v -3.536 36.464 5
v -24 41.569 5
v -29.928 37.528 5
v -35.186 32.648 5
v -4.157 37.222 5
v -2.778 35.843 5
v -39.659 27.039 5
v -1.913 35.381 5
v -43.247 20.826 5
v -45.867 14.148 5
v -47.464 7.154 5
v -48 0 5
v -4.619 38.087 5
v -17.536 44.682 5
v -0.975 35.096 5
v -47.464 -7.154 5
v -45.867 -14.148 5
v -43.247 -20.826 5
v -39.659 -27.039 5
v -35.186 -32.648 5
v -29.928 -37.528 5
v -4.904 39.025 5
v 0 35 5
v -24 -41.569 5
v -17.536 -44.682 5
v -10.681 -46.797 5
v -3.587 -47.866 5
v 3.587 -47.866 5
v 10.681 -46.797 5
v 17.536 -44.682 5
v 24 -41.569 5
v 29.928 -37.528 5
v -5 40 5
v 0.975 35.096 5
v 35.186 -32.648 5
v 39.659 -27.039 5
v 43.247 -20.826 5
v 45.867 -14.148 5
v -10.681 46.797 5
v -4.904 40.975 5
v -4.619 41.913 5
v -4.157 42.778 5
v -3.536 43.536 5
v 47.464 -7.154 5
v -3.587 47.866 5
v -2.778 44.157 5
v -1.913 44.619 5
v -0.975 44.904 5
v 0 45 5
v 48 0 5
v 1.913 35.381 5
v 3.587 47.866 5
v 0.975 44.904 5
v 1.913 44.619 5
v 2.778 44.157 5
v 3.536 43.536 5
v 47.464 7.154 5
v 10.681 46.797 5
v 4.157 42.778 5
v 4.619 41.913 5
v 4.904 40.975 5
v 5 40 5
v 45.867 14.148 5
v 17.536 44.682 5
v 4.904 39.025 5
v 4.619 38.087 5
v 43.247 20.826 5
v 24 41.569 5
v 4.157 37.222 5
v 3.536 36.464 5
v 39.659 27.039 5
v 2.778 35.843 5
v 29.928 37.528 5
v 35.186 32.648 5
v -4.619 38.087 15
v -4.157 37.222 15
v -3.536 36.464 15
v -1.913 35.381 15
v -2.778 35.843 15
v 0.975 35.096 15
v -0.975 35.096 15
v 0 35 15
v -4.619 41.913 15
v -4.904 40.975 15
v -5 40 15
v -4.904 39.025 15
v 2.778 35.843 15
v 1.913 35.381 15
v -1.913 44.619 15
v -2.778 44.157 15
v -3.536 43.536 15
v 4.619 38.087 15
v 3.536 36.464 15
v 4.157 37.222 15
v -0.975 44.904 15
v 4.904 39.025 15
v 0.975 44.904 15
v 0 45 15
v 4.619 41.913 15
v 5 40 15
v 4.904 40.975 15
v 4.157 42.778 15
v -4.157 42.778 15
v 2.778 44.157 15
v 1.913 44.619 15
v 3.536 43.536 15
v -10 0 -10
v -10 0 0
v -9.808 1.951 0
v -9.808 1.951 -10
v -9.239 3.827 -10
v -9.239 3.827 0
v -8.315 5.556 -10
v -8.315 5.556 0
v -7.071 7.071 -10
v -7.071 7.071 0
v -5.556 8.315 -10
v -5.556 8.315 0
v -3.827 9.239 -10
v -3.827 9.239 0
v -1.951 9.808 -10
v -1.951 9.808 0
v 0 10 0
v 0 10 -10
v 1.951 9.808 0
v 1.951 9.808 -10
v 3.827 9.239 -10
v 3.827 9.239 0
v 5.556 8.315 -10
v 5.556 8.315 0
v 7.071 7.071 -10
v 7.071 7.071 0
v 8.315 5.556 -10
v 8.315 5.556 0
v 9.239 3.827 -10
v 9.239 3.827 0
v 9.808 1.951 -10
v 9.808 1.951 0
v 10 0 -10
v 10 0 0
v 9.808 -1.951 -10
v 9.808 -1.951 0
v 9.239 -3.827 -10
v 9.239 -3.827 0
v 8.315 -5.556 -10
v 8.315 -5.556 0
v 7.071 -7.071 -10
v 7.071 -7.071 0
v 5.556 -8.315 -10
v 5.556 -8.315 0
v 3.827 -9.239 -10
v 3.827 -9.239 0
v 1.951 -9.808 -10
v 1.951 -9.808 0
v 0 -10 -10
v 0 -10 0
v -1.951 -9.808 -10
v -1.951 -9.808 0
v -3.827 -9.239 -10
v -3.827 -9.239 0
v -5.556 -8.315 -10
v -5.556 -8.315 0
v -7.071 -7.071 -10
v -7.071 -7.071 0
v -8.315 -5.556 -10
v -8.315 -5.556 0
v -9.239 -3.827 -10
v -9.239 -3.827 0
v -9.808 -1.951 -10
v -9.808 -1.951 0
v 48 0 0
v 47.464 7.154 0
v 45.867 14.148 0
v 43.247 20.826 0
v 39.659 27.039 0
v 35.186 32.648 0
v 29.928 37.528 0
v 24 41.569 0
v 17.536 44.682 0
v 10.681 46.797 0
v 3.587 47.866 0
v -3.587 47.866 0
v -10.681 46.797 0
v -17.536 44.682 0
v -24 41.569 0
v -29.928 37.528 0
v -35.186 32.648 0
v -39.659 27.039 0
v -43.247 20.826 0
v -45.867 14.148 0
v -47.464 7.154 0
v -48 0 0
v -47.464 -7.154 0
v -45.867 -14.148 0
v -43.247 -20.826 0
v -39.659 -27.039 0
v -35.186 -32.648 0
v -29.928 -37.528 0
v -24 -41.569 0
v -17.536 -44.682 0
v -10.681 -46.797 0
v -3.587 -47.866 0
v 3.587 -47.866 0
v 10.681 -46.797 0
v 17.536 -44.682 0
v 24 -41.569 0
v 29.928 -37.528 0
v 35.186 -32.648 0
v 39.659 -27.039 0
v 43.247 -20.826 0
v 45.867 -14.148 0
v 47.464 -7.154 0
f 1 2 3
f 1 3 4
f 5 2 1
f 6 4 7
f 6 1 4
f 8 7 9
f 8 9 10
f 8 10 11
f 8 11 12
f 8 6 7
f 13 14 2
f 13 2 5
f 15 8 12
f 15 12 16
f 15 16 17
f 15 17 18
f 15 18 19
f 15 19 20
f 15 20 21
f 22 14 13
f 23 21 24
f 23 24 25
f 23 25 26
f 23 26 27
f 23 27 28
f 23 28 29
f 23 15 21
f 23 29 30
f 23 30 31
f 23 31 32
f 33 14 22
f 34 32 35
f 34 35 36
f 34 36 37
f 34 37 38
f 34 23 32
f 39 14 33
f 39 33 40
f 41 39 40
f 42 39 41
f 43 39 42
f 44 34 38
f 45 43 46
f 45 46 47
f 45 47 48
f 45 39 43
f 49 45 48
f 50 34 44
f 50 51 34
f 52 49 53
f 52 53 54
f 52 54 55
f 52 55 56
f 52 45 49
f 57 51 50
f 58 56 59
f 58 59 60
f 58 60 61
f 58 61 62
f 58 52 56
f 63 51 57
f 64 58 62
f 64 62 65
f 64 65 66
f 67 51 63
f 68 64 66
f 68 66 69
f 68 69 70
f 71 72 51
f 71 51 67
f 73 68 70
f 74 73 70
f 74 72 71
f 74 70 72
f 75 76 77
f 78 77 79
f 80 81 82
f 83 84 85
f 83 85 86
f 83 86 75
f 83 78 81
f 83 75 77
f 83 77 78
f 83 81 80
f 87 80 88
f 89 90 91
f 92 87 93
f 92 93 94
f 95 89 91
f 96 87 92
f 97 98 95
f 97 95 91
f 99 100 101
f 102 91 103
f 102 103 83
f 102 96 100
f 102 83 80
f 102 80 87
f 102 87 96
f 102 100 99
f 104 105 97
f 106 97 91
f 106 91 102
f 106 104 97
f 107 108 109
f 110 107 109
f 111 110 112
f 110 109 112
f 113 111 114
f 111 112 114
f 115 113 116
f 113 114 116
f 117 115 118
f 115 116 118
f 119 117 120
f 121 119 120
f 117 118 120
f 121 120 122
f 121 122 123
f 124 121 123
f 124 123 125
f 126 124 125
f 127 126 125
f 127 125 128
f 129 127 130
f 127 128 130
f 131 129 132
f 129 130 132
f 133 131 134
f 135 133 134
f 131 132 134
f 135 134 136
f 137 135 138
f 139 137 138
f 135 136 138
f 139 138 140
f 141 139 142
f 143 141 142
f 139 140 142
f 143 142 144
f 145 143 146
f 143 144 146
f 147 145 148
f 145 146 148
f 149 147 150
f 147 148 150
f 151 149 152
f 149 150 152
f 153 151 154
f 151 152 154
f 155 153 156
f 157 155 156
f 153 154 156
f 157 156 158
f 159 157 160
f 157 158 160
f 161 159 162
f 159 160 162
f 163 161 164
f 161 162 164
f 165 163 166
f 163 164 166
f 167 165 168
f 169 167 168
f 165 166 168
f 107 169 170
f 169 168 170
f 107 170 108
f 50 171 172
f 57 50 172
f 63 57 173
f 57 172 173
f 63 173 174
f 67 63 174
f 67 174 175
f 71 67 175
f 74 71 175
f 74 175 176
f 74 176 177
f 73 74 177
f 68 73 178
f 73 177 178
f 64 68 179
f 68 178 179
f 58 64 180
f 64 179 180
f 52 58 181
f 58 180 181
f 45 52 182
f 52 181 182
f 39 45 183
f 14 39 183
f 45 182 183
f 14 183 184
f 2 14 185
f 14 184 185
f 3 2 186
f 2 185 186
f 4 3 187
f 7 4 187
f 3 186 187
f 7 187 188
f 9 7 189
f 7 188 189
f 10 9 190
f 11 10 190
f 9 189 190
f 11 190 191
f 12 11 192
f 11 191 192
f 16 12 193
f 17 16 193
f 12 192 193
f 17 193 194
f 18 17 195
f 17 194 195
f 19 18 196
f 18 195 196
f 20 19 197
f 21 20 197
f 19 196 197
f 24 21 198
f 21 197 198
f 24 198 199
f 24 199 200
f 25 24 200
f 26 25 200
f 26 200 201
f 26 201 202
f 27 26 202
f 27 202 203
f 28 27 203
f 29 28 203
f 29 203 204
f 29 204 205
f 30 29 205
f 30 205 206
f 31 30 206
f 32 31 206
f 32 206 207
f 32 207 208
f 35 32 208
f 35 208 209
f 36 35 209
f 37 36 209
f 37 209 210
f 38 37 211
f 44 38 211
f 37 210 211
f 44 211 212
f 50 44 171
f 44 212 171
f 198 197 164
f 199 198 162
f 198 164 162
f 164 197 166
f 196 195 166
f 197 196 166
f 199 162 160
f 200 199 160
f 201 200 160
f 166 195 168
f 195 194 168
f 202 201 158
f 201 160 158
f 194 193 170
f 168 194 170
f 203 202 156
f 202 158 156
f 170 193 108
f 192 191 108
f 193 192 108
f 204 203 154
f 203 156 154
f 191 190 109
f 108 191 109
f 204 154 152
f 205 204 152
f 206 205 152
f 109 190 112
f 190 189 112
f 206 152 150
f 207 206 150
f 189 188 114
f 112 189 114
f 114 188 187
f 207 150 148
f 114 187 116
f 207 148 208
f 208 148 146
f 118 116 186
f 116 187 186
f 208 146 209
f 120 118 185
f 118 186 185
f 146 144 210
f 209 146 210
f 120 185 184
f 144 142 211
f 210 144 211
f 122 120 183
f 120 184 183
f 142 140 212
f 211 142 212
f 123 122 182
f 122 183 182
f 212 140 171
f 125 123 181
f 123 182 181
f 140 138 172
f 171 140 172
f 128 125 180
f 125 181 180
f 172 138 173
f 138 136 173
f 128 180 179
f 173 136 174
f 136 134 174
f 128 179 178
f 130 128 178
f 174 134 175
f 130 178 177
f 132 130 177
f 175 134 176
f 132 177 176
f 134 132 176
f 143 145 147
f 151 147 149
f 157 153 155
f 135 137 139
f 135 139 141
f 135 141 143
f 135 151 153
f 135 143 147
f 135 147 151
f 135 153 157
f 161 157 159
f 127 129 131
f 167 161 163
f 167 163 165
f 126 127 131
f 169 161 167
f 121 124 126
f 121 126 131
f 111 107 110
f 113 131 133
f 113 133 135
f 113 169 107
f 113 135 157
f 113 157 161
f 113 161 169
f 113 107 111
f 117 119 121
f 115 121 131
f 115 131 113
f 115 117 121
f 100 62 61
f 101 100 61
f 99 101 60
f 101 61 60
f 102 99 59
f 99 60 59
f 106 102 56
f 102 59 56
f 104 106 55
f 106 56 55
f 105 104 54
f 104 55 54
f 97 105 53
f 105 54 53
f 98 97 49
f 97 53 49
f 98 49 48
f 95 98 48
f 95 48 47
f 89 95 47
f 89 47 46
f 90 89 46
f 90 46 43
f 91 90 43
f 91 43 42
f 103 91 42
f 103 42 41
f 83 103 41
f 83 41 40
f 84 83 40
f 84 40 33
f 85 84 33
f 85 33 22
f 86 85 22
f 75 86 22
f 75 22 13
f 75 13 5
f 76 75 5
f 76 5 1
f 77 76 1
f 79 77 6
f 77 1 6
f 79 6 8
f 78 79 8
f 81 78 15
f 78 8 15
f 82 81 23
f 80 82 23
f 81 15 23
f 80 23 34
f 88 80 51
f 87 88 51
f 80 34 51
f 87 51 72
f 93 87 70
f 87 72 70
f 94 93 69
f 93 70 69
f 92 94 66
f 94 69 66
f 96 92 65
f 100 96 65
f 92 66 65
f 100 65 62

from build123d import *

# Parameters (mm, degrees)
ESBO_O1_R                = 48
RESSALTO_EXTRUS_O1_DEPTH = 5
ESBO_O2_R                = 5
RESSALTO_EXTRUS_O2_DEPTH = 15
ESBO_O3_R                = 10
RESSALTO_EXTRUS_O4_DEPTH = 10


with BuildPart() as part:
    # Esboço1 → Ressalto-extrusão1 (new body)
    with BuildSketch(Plane.XY):
        Circle(ESBO_O1_R)
    extrude(amount=RESSALTO_EXTRUS_O1_DEPTH)

    # Esboço2 → Ressalto-extrusão2 (add)
    with BuildSketch(Plane.XY):
        with Locations((0, 40)):
            Circle(ESBO_O2_R)
    extrude(amount=RESSALTO_EXTRUS_O2_DEPTH)

    # Esboço3 → Ressalto-extrusão4 (add)
    with BuildSketch(Plane(origin=(0, 0, 0), x_dir=(-1, 0, 0), z_dir=(0, 0, -1))):
        Circle(ESBO_O3_R)
    extrude(amount=RESSALTO_EXTRUS_O4_DEPTH)


solid = part.part
